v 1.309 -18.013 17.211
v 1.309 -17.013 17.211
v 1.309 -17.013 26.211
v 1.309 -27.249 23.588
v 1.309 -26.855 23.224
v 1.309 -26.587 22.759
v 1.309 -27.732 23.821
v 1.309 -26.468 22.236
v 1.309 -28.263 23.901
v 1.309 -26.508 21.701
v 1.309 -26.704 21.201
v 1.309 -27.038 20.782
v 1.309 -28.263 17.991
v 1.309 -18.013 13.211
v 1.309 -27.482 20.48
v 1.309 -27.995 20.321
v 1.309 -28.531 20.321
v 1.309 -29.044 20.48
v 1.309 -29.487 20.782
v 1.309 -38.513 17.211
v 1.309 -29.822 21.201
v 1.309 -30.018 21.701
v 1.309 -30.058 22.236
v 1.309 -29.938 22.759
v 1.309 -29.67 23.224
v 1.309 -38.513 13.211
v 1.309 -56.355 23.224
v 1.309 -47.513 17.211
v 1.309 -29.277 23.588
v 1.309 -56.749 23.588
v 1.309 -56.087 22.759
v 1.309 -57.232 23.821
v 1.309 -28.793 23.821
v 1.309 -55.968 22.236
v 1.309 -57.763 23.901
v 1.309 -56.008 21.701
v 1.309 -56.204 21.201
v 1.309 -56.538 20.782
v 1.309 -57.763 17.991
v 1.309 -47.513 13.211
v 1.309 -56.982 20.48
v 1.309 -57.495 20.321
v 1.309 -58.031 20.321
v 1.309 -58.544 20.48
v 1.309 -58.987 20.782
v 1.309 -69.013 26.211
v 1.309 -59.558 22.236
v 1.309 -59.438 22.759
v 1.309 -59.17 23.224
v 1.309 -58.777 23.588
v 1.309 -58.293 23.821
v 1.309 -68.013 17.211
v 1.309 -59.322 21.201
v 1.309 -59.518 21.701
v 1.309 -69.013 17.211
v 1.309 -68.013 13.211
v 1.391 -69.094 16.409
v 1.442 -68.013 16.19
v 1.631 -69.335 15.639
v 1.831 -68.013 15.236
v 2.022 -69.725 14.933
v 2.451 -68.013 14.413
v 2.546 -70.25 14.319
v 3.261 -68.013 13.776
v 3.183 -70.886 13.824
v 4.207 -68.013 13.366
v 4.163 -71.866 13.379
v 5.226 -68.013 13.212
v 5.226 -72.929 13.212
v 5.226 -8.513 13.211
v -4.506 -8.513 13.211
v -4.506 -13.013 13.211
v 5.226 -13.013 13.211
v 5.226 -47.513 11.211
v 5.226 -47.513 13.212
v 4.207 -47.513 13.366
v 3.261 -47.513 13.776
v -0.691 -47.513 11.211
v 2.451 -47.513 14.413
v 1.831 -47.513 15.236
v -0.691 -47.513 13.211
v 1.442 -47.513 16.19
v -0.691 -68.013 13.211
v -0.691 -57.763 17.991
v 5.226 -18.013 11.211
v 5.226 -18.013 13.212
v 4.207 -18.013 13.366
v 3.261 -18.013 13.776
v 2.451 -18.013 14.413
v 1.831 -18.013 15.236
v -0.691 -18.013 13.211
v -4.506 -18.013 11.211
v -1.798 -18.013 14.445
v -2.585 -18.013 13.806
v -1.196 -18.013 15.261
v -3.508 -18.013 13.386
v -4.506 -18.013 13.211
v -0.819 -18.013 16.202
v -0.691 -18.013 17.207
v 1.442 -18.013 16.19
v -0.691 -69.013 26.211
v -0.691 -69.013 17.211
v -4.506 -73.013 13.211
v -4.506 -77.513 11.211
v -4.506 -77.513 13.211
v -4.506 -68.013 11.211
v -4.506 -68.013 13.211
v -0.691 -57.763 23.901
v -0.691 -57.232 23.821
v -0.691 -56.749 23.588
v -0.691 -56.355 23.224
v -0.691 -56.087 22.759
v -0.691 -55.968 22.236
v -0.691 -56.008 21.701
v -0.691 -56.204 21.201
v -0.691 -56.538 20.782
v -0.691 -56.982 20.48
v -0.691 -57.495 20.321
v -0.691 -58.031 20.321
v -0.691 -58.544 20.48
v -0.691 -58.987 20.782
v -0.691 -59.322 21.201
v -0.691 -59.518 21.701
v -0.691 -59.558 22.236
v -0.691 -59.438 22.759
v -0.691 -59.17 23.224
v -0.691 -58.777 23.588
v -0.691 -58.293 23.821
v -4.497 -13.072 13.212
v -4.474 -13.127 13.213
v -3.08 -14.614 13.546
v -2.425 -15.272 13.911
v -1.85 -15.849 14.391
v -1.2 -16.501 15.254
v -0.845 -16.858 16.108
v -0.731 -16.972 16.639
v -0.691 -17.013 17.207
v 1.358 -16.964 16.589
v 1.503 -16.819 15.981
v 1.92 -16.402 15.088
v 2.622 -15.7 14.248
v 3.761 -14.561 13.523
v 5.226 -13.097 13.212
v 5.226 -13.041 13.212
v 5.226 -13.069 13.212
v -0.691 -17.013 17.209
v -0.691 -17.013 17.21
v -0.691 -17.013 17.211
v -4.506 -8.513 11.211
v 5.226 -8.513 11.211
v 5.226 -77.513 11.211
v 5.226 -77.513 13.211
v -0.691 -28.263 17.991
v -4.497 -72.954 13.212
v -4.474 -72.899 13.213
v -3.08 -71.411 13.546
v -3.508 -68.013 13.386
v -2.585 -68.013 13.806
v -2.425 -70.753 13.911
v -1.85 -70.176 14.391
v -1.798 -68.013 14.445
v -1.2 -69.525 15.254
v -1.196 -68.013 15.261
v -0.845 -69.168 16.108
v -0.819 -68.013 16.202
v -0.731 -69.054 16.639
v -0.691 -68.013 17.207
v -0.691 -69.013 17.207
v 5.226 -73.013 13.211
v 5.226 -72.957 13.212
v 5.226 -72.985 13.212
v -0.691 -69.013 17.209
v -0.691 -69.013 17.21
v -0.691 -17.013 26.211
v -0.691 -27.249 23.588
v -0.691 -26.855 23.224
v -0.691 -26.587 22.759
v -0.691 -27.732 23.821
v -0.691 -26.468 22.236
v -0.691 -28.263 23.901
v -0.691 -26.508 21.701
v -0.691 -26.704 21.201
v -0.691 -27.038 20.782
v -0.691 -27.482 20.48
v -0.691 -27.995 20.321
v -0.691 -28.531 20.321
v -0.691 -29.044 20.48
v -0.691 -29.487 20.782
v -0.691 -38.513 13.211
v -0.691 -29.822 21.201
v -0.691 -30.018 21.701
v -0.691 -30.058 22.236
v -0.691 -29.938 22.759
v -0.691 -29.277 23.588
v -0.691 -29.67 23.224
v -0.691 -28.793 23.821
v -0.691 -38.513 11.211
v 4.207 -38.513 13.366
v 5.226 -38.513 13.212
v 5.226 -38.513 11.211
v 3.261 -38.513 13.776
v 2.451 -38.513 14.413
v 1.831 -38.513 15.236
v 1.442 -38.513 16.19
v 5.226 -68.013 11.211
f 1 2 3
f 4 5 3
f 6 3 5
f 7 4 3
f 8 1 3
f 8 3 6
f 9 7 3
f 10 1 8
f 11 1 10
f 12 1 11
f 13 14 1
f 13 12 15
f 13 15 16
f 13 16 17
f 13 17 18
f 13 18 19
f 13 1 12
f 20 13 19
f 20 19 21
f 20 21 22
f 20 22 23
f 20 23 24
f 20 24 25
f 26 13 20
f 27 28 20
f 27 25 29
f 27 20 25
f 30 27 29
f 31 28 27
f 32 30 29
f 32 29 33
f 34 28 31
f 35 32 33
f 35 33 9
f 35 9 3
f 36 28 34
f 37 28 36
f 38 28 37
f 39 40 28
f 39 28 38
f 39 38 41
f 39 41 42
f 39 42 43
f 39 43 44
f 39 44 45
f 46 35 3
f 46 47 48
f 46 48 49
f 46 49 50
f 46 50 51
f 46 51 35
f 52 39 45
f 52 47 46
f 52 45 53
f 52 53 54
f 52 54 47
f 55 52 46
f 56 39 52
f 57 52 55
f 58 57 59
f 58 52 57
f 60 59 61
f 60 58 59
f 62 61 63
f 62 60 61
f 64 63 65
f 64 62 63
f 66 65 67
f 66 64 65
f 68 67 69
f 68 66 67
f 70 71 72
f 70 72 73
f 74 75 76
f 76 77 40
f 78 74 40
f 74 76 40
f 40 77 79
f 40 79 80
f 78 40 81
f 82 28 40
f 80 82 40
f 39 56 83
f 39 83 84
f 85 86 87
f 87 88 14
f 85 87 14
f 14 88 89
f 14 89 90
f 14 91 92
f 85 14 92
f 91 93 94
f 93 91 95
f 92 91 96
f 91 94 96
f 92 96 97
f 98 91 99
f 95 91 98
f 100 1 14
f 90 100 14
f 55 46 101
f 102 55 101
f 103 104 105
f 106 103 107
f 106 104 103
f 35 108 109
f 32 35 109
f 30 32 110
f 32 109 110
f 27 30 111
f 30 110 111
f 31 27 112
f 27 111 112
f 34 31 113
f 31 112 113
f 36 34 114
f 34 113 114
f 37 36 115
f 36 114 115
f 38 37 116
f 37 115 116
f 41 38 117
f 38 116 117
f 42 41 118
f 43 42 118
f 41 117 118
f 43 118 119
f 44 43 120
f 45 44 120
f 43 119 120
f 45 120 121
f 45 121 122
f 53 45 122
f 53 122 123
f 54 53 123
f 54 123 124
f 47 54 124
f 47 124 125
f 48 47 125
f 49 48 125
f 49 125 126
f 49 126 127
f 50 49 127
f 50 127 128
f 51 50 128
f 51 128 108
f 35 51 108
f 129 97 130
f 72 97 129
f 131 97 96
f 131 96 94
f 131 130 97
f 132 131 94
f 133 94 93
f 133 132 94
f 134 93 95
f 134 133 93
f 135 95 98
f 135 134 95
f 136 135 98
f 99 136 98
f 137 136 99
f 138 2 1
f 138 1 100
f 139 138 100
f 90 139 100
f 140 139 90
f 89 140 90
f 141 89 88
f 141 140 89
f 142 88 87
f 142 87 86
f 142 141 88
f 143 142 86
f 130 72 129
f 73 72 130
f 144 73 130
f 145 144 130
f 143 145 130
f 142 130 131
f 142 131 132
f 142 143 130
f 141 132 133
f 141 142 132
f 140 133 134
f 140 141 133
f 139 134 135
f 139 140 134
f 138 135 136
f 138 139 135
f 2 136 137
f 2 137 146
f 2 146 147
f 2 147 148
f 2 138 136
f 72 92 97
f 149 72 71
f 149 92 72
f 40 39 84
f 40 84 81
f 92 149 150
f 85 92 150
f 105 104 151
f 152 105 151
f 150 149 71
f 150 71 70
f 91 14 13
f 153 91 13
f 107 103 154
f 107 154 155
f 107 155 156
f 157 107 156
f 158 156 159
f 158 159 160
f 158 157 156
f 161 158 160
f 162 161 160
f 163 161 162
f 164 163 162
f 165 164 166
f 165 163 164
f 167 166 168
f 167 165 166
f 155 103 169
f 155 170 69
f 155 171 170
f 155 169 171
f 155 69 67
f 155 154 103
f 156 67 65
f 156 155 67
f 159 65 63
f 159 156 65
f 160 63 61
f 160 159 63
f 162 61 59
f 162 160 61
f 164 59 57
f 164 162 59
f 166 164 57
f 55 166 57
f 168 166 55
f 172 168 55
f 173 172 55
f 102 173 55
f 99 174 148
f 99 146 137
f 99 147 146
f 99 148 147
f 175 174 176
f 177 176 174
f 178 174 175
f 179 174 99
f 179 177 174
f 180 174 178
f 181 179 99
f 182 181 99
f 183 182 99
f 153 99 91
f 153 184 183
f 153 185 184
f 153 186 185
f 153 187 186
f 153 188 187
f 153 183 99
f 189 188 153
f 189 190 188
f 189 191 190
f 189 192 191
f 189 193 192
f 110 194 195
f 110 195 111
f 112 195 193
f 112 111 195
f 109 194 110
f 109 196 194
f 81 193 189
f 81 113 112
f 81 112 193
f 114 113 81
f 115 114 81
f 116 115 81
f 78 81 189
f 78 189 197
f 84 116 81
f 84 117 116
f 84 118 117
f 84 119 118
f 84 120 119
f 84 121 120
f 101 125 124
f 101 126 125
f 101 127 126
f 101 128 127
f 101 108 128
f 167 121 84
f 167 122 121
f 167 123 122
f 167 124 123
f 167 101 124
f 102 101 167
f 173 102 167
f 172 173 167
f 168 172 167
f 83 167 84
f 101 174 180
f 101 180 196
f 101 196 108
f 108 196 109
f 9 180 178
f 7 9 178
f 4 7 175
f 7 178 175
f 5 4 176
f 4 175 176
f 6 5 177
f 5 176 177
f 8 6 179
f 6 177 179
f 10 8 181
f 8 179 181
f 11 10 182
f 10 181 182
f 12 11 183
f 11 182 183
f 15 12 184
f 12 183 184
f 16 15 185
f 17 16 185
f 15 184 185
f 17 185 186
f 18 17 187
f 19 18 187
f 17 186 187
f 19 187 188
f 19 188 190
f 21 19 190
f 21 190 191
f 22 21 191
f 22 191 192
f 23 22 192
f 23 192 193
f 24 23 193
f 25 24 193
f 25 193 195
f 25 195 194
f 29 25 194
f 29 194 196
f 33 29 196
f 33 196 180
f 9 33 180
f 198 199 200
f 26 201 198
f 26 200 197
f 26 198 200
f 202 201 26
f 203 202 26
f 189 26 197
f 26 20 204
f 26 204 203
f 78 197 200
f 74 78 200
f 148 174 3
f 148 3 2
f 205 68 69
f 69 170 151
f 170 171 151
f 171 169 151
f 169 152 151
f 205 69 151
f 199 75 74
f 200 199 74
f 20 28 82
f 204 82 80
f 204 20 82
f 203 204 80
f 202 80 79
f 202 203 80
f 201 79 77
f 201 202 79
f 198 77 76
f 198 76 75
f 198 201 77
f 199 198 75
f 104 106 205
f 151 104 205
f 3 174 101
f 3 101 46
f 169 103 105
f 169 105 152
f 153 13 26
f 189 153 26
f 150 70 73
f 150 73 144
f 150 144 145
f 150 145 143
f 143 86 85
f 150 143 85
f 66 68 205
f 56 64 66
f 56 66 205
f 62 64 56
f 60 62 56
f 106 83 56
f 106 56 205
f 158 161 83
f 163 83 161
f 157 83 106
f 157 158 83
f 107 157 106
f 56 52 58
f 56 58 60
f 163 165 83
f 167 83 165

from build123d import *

# Parameters (mm, degrees)
SKETCH2_W             = 5.91625
SKETCH2_H             = 9
BOSS_EXTRUDE1_DEPTH   = 2
SKETCH2_W_2           = 9.732
SKETCH2_H_2           = 9.5
BOSS_EXTRUDE1_2_DEPTH = 2
BOSS_EXTRUDE1_3_DEPTH = 2
SKETCH3_W             = 2
SKETCH3_H             = 1
BOSS_EXTRUDE2_DEPTH   = 13
FILLET1_R             = 4
CUT_EXTRUDE1_DEPTH    = 83.031058661
M3_CLEARANCE_HOLE2_D  = 3.6


with BuildPart() as part:
    # Sketch2 → Boss-Extrude1 (new body)
    with BuildSketch(Plane.XY.offset(11.211435671)):
        with Locations((2.267401673, -43.012787822)):
            Rectangle(SKETCH2_W, SKETCH2_H)
    extrude(amount=BOSS_EXTRUDE1_DEPTH)



with BuildPart() as body_2:
    # Sketch2 → Boss-Extrude1 2 (new body)
    with BuildSketch(Plane.XY.offset(11.211435671)):
        with Locations((0.359526673, -72.762787822)):
            Rectangle(SKETCH2_W_2, SKETCH2_H_2)
    extrude(amount=BOSS_EXTRUDE1_2_DEPTH)


with BuildPart() as body_3:
    # Sketch2 → Boss-Extrude1 3 (new body)
    with BuildSketch(Plane.XY.offset(11.211435671)):
        with Locations((0.359526673, -13.262787822)):
            Rectangle(SKETCH2_W_2, SKETCH2_H_2)
    extrude(amount=BOSS_EXTRUDE1_3_DEPTH)


with BuildPart() as part_1:
    add(part.part)

    add(body_2.part)  # Boss-Extrude2 merges body 2

    add(body_3.part)  # Boss-Extrude2 merges body 3
    # Sketch3 → Boss-Extrude2 (add)
    with BuildSketch(Plane.XY.offset(13.211435671)):
        Polygon((-0.690723327, -17.012787822), (-0.690723327, -38.512787822), (-0.690723327, -47.512787822), (-0.690723327, -68.012787822), (1.309276673, -68.012787822), (1.309276673, -17.012787822), align=None)
        with Locations((0.309276673, -68.512787822)):
            Rectangle(SKETCH3_W, SKETCH3_H)
    extrude(amount=BOSS_EXTRUDE2_DEPTH)

    # Fillet1
    # the kernel refuses this fillet: 4 mm, written as the material it adds along each edge
    with BuildSketch(Plane(origin=(-0.690723327, -17.012787822, 13.211435671), x_dir=(0, 0, 1), z_dir=(0, -1, 0)), Plane(origin=(-0.690723327, -68.012787822, 13.211435671), x_dir=(0, 0, 1), z_dir=(0, -1, 0))) as fillet1_piece_1:
        with BuildLine():
            CenterArc((3.995754239, 4), FILLET1_R, 182.64012102, 87.35987898)
            Line((0, 3.81575), (0, 0))
            Line((0, 0), (3.995754239, 0))
        make_face()
    extrude(amount=1)
    with BuildSketch(Plane(origin=(1.309276673, -17.012787822, 13.211435671), x_dir=(0, 1, 0), z_dir=(-1, 0, 0))) as fillet1_piece_2:
        with BuildLine():
            CenterArc((FILLET1_R, -FILLET1_R), FILLET1_R, 90, 90)
            Line((0, -FILLET1_R), (0, 0))
            Line((0, 0), (FILLET1_R, 0))
        make_face()
    extrude(amount=2)
    with BuildSketch(Plane(origin=(1.309276673, -17.012787822, 13.211435671), x_dir=(1, 0, 0), z_dir=(0, -1, 0))) as fillet1_piece_3_section:
        with BuildLine():
            CenterArc((FILLET1_R, FILLET1_R), FILLET1_R, 180, 90)
            Line((0, FILLET1_R), (0, 0))
            Line((0, 0), (FILLET1_R, 0))
        make_face()
    fillet1_piece_3 = extrude(amount=1, mode=Mode.PRIVATE)
    fillet1_piece_3 = split(fillet1_piece_3, bisect_by=Plane(origin=(5.225526673, -17.012787822, 13.211435671), z_dir=(-1, 0, 0)), keep=Keep.TOP, mode=Mode.PRIVATE)
    add(fillet1_piece_3)
    with BuildSketch(Plane(origin=(1.309276673, -38.512787822, 13.211435671), x_dir=(1, 0, 0), z_dir=(0, -1, 0))) as fillet1_piece_4_section:
        with BuildLine():
            CenterArc((FILLET1_R, FILLET1_R), FILLET1_R, 180, 90)
            Line((0, FILLET1_R), (0, 0))
            Line((0, 0), (FILLET1_R, 0))
        make_face()
    fillet1_piece_4 = extrude(amount=9, mode=Mode.PRIVATE)
    fillet1_piece_4 = split(fillet1_piece_4, bisect_by=Plane(origin=(5.225526673, -38.512787822, 13.211435671), z_dir=(-1, 0, 0)), keep=Keep.TOP, mode=Mode.PRIVATE)
    add(fillet1_piece_4)
    with BuildSketch(Plane(origin=(1.309276673, -68.012787822, 13.211435671), x_dir=(1, 0, 0), z_dir=(0, -1, 0))) as fillet1_piece_5_section:
        with BuildLine():
            CenterArc((FILLET1_R, FILLET1_R), FILLET1_R, 180, 90)
            Line((0, FILLET1_R), (0, 0))
            Line((0, 0), (FILLET1_R, 0))
        make_face()
    fillet1_piece_5 = extrude(amount=1, mode=Mode.PRIVATE)
    fillet1_piece_5 = split(fillet1_piece_5, bisect_by=Plane(origin=(5.225526673, -68.012787822, 13.211435671), z_dir=(-1, 0, 0)), keep=Keep.TOP, mode=Mode.PRIVATE)
    add(fillet1_piece_5)
    with BuildSketch(Plane(origin=(-0.690723327, -69.012787822, 13.211435671), x_dir=(0, 0, 1), z_dir=(1, 0, 0))) as fillet1_piece_6:
        with BuildLine():
            CenterArc((FILLET1_R, FILLET1_R), FILLET1_R, 180, 90)
            Line((0, FILLET1_R), (0, 0))
            Line((0, 0), (FILLET1_R, 0))
        make_face()
    extrude(amount=2)
    with BuildSketch(Plane(origin=(-0.690723327, -7.023402225, 13.211435671), x_dir=(0, 0, 1), z_dir=(0, -1, 0))) as fillet1_piece_7a_section:
        with BuildLine():
            CenterArc((3.995754239, 4), FILLET1_R, 182.64012102, 87.35987898)
            Line((0, 3.81575), (0, 0))
            Line((0, 0), (3.995754239, 0))
        make_face()
    fillet1_piece_7a = extrude(amount=10.989385597, mode=Mode.PRIVATE)
    fillet1_piece_7a = split(fillet1_piece_7a, bisect_by=Plane(origin=(-0.690723327, -17.012787822, 13.211435671), z_dir=(0, 1, 0)), keep=Keep.TOP, mode=Mode.PRIVATE)
    fillet1_piece_7a = split(fillet1_piece_7a, bisect_by=Plane(origin=(-0.690723327, -8.512787822, 13.211435671), z_dir=(0, -1, 0)), keep=Keep.TOP, mode=Mode.PRIVATE)
    with BuildSketch(Plane(origin=(1.309276673, -17.012787822, 13.211435671), x_dir=(0, 1, 0), z_dir=(-1, 0, 0))) as fillet1_piece_7b_section:
        with BuildLine():
            CenterArc((FILLET1_R, -FILLET1_R), FILLET1_R, 90, 90)
            Line((0, -FILLET1_R), (0, 0))
            Line((0, 0), (FILLET1_R, 0))
        make_face()
    fillet1_piece_7b = extrude(amount=12, mode=Mode.PRIVATE)
    fillet1_piece_7b = split(fillet1_piece_7b, bisect_by=Plane(origin=(-0.690723327, -17.012787822, 13.211435671), z_dir=(-1, 0, 0)), keep=Keep.TOP, mode=Mode.PRIVATE)
    fillet1_piece_7b = split(fillet1_piece_7b, bisect_by=Plane(origin=(-4.506473327, -17.012787822, 13.211435671), z_dir=(1, 0, 0)), keep=Keep.TOP, mode=Mode.PRIVATE)
    fillet1_piece_7 = fillet1_piece_7a & fillet1_piece_7b
    add(fillet1_piece_7)
    with BuildSketch(Plane(origin=(1.309276673, -7.012787822, 13.211435671), x_dir=(1, 0, 0), z_dir=(0, -1, 0))) as fillet1_piece_8a_section:
        with BuildLine():
            CenterArc((FILLET1_R, FILLET1_R), FILLET1_R, 180, 90)
            Line((0, FILLET1_R), (0, 0))
            Line((0, 0), (FILLET1_R, 0))
        make_face()
    fillet1_piece_8a = extrude(amount=11, mode=Mode.PRIVATE)
    fillet1_piece_8a = split(fillet1_piece_8a, bisect_by=Plane(origin=(1.309276673, -17.012787822, 13.211435671), z_dir=(0, 1, 0)), keep=Keep.TOP, mode=Mode.PRIVATE)
    fillet1_piece_8a = split(fillet1_piece_8a, bisect_by=Plane(origin=(1.309276673, -8.512787822, 13.211435671), z_dir=(0, -1, 0)), keep=Keep.TOP, mode=Mode.PRIVATE)
    with BuildSketch(Plane(origin=(11.309276673, -17.012787822, 13.211435671), x_dir=(0, 1, 0), z_dir=(-1, 0, 0))) as fillet1_piece_8b_section:
        with BuildLine():
            CenterArc((FILLET1_R, -FILLET1_R), FILLET1_R, 90, 90)
            Line((0, -FILLET1_R), (0, 0))
            Line((0, 0), (FILLET1_R, 0))
        make_face()
    fillet1_piece_8b = extrude(amount=12, mode=Mode.PRIVATE)
    fillet1_piece_8b = split(fillet1_piece_8b, bisect_by=Plane(origin=(1.309276673, -17.012787822, 13.211435671), z_dir=(1, 0, 0)), keep=Keep.TOP, mode=Mode.PRIVATE)
    fillet1_piece_8b = split(fillet1_piece_8b, bisect_by=Plane(origin=(5.225526673, -17.012787822, 13.211435671), z_dir=(-1, 0, 0)), keep=Keep.TOP, mode=Mode.PRIVATE)
    fillet1_piece_8 = fillet1_piece_8a & fillet1_piece_8b
    add(fillet1_piece_8)
    with BuildSketch(Plane(origin=(-0.690723327, -68.012787822, 13.211435671), x_dir=(0, 0, 1), z_dir=(0, -1, 0))) as fillet1_piece_9a_section:
        with BuildLine():
            CenterArc((3.995754239, 4), FILLET1_R, 182.64012102, 87.35987898)
            Line((0, 3.81575), (0, 0))
            Line((0, 0), (3.995754239, 0))
        make_face()
    fillet1_piece_9a = extrude(amount=10.989385597, mode=Mode.PRIVATE)
    fillet1_piece_9a = split(fillet1_piece_9a, bisect_by=Plane(origin=(-0.690723327, -69.012787822, 13.211435671), z_dir=(0, -1, 0)), keep=Keep.TOP, mode=Mode.PRIVATE)
    fillet1_piece_9a = split(fillet1_piece_9a, bisect_by=Plane(origin=(-0.690723327, -77.512787822, 13.211435671), z_dir=(0, 1, 0)), keep=Keep.TOP, mode=Mode.PRIVATE)
    with BuildSketch(Plane(origin=(-10.690723327, -69.012787822, 13.211435671), x_dir=(0, 0, 1), z_dir=(1, 0, 0))) as fillet1_piece_9b_section:
        with BuildLine():
            CenterArc((FILLET1_R, FILLET1_R), FILLET1_R, 180, 90)
            Line((0, FILLET1_R), (0, 0))
            Line((0, 0), (FILLET1_R, 0))
        make_face()
    fillet1_piece_9b = extrude(amount=12, mode=Mode.PRIVATE)
    fillet1_piece_9b = split(fillet1_piece_9b, bisect_by=Plane(origin=(-0.690723327, -69.012787822, 13.211435671), z_dir=(-1, 0, 0)), keep=Keep.TOP, mode=Mode.PRIVATE)
    fillet1_piece_9b = split(fillet1_piece_9b, bisect_by=Plane(origin=(-4.506473327, -69.012787822, 13.211435671), z_dir=(1, 0, 0)), keep=Keep.TOP, mode=Mode.PRIVATE)
    fillet1_piece_9 = fillet1_piece_9a & fillet1_piece_9b
    add(fillet1_piece_9)
    with BuildSketch(Plane(origin=(-0.690723327, -69.012787822, 13.211435671), x_dir=(0, 0, 1), z_dir=(1, 0, 0))) as fillet1_piece_10a_section:
        with BuildLine():
            CenterArc((FILLET1_R, FILLET1_R), FILLET1_R, 180, 90)
            Line((0, FILLET1_R), (0, 0))
            Line((0, 0), (FILLET1_R, 0))
        make_face()
    fillet1_piece_10a = extrude(amount=12, mode=Mode.PRIVATE)
    fillet1_piece_10a = split(fillet1_piece_10a, bisect_by=Plane(origin=(1.309276673, -69.012787822, 13.211435671), z_dir=(1, 0, 0)), keep=Keep.TOP, mode=Mode.PRIVATE)
    fillet1_piece_10a = split(fillet1_piece_10a, bisect_by=Plane(origin=(5.225526673, -69.012787822, 13.211435671), z_dir=(-1, 0, 0)), keep=Keep.TOP, mode=Mode.PRIVATE)
    with BuildSketch(Plane(origin=(1.309276673, -68.012787822, 13.211435671), x_dir=(1, 0, 0), z_dir=(0, -1, 0))) as fillet1_piece_10b_section:
        with BuildLine():
            CenterArc((FILLET1_R, FILLET1_R), FILLET1_R, 180, 90)
            Line((0, FILLET1_R), (0, 0))
            Line((0, 0), (FILLET1_R, 0))
        make_face()
    fillet1_piece_10b = extrude(amount=11, mode=Mode.PRIVATE)
    fillet1_piece_10b = split(fillet1_piece_10b, bisect_by=Plane(origin=(1.309276673, -69.012787822, 13.211435671), z_dir=(0, -1, 0)), keep=Keep.TOP, mode=Mode.PRIVATE)
    fillet1_piece_10b = split(fillet1_piece_10b, bisect_by=Plane(origin=(1.309276673, -77.512787822, 13.211435671), z_dir=(0, 1, 0)), keep=Keep.TOP, mode=Mode.PRIVATE)
    fillet1_piece_10 = fillet1_piece_10a & fillet1_piece_10b
    add(fillet1_piece_10)

    # Sketch6 → Cut-Extrude1 (cut, through all)
    with BuildSketch(Plane(origin=(1.309276673, 0, 0), x_dir=(0, 0, -1), z_dir=(1, 0, 0))):
        Polygon((-13.211435671, -18.012787822), (-17.991089167, -28.262787822), (-13.211435671, -38.512787822), align=None)
        Polygon((-17.991089167, -57.762787822), (-13.211435671, -47.512787822), (-13.211435671, -68.012787822), align=None)
    extrude(amount=-CUT_EXTRUDE1_DEPTH, mode=Mode.SUBTRACT)

    # M3 Clearance Hole2 (through all)
    with Locations(Plane(origin=(1.309276673, 0, 0), x_dir=(0, 0, -1), z_dir=(1, 0, 0))):
        with Locations((-22.101262419, -28.262787822), (-22.101262419, -57.762787822)):
            Hole(M3_CLEARANCE_HOLE2_D / 2)


solid = part_1.part
